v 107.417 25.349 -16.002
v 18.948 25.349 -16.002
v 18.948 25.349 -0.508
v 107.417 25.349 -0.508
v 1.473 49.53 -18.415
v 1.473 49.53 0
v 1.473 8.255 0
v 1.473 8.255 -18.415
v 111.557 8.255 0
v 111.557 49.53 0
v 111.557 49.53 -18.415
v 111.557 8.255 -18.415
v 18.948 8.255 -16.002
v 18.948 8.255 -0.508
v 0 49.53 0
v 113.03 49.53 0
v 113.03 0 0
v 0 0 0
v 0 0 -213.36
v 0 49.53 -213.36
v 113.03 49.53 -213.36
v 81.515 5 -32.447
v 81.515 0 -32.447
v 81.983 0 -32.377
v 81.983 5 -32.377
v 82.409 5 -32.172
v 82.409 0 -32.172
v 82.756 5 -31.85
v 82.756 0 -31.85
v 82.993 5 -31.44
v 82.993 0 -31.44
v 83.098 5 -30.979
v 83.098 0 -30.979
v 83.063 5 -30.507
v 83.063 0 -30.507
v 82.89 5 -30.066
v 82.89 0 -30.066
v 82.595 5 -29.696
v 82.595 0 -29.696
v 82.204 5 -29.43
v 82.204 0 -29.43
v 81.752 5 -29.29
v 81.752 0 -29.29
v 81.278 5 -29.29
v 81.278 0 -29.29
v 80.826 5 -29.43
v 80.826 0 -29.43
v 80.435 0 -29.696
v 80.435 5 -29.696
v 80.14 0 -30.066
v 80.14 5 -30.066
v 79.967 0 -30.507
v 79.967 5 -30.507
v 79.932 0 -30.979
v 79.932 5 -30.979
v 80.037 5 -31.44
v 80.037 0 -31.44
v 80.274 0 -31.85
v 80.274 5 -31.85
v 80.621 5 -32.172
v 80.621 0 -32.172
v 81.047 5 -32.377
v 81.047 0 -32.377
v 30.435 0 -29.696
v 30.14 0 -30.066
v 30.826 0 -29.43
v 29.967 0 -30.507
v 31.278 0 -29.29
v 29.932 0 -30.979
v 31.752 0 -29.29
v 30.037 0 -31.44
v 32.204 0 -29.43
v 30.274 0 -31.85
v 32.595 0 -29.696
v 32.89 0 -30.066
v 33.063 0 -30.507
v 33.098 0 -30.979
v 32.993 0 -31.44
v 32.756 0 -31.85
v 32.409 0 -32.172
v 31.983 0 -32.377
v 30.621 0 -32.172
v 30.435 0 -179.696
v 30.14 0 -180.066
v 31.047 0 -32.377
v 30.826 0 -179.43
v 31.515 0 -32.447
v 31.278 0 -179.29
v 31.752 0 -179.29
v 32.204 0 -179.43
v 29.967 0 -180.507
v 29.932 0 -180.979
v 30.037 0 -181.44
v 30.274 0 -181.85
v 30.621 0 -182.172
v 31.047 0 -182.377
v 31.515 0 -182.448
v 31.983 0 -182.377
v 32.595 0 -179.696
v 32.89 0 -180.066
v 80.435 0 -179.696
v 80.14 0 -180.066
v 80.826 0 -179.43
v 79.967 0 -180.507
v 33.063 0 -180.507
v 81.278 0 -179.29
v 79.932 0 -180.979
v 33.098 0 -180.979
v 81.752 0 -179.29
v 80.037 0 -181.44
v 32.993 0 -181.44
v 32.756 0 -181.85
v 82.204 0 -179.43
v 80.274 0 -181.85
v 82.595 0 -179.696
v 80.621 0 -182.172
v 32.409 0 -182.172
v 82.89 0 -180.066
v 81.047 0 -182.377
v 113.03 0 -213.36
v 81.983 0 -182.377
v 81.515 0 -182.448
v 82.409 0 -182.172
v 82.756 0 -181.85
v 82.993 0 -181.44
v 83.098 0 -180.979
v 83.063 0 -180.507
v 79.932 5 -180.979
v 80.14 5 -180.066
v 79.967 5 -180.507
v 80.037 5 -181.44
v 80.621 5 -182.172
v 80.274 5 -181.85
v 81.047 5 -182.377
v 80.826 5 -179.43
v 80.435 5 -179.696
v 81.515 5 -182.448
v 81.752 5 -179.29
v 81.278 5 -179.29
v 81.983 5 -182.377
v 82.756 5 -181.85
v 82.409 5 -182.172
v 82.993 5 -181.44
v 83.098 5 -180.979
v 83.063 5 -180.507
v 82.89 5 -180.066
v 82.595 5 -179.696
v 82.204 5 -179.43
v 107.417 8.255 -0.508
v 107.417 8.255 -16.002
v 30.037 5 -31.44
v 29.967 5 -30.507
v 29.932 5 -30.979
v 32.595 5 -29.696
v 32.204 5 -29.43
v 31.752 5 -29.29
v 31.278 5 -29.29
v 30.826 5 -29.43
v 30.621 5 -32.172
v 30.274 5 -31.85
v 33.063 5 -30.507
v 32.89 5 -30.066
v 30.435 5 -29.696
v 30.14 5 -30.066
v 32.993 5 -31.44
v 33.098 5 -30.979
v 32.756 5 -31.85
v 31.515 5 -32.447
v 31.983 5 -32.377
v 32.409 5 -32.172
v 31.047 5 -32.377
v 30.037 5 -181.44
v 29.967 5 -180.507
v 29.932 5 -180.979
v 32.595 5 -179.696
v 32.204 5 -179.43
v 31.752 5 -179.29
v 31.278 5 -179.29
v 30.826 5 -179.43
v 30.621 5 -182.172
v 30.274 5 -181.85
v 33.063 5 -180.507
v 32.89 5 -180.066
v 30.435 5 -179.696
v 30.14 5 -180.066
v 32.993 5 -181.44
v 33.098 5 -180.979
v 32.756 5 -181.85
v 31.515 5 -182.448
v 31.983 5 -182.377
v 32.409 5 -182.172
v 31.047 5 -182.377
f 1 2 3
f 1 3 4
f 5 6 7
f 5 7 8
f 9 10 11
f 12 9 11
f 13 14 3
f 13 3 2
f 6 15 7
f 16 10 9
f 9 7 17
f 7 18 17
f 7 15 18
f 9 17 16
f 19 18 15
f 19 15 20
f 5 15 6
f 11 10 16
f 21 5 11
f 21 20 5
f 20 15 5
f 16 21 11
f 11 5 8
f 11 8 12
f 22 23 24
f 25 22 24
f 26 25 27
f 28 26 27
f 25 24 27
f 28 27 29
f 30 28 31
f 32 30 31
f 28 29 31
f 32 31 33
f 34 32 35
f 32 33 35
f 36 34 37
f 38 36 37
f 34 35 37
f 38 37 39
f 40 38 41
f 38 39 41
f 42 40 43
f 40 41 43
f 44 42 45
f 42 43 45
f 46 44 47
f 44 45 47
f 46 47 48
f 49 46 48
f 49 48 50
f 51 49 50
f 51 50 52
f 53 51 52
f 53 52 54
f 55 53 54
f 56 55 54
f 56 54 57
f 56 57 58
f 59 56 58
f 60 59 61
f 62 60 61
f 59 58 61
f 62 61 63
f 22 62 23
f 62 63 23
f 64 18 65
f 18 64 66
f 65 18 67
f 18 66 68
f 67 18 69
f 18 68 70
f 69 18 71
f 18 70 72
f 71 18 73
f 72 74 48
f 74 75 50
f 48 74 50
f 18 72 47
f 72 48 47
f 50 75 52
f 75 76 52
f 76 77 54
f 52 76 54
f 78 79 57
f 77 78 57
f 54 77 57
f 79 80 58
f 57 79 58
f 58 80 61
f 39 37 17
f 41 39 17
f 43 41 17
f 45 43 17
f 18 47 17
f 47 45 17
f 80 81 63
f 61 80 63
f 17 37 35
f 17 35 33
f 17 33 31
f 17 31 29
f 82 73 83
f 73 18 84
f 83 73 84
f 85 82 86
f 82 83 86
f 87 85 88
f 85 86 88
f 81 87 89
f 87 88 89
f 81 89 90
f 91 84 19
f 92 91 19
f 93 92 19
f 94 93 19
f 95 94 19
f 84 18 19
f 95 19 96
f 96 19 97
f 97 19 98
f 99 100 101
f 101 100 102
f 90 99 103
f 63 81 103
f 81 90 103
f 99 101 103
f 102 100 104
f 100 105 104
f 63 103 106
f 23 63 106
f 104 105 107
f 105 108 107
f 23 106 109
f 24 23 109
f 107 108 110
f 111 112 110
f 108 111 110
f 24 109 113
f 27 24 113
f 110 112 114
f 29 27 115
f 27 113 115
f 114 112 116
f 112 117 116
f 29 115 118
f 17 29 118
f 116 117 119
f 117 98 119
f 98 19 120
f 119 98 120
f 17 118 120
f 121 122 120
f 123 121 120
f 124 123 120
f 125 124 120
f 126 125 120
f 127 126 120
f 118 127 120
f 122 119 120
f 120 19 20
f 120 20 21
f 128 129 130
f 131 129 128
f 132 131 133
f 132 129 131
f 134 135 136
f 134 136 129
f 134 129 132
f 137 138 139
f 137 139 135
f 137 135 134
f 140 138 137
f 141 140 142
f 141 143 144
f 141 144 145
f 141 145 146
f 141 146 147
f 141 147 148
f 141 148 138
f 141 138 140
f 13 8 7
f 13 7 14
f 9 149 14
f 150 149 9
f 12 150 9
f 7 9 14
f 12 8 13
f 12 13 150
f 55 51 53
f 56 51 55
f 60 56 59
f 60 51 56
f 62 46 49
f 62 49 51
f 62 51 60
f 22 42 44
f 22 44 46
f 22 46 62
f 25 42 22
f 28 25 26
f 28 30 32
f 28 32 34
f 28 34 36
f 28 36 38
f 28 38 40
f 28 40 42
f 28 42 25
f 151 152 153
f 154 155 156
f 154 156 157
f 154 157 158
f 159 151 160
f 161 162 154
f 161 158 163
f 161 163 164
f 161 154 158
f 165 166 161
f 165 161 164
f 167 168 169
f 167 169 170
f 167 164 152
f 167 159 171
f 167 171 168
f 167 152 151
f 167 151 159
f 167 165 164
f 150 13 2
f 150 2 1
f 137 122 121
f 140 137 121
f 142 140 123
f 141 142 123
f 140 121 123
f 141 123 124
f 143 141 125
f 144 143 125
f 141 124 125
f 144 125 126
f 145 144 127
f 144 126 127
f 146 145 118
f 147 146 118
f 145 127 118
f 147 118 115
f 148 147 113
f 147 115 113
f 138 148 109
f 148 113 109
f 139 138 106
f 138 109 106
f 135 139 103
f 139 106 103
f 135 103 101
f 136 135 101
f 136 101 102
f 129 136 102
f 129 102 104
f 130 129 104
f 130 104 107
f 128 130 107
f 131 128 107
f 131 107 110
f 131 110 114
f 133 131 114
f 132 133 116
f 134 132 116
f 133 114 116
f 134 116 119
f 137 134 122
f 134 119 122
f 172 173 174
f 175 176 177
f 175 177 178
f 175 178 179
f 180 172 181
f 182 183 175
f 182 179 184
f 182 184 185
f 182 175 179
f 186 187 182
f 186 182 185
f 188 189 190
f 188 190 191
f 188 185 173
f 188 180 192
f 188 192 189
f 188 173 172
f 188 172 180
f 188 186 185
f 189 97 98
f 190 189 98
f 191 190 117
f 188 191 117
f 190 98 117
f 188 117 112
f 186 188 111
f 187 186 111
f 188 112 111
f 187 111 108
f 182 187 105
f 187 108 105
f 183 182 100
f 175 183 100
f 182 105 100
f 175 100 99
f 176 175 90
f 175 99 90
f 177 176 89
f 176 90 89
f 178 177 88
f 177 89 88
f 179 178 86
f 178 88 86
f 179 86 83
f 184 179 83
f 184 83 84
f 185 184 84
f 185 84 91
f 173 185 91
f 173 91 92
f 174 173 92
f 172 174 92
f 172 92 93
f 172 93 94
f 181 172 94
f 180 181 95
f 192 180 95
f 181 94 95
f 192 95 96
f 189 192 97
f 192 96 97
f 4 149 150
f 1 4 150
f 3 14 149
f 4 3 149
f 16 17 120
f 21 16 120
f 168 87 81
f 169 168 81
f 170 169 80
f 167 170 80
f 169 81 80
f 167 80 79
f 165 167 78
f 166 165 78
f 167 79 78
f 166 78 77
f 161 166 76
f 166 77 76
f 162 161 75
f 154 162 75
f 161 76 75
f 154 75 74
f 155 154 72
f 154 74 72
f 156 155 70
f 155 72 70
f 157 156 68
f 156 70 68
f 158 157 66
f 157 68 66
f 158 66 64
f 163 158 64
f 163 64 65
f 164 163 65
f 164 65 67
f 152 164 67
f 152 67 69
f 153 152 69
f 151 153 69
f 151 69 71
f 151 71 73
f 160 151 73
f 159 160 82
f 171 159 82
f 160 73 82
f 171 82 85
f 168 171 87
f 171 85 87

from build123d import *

# Parameters (mm, degrees)
SKETCH1_W           = 113.03
SKETCH1_H           = 213.36
BOSS_EXTRUDE1_DEPTH = 49.53
SKETCH2_W           = 110.0836
SKETCH2_H           = 18.415
CUT_EXTRUDE1_DEPTH  = 41.275
SKETCH3_W           = 88.4682
SKETCH3_H           = 15.494
BOSS_EXTRUDE2_DEPTH = 17.0942
SKETCH4_R           = 1.5875
CUT_EXTRUDE2_DEPTH  = 5


with BuildPart() as part:
    # Sketch1 → Boss-Extrude1 (new body)
    with BuildSketch(Plane(origin=(0, 0, 0), x_dir=(1, 0, 0), z_dir=(0, 1, 0))):
        with Locations((56.515, 106.68)):
            Rectangle(SKETCH1_W, SKETCH1_H)
    extrude(amount=BOSS_EXTRUDE1_DEPTH)

    # Sketch2 → Cut-Extrude1 (cut)
    with BuildSketch(Plane(origin=(0, 49.53, 0), x_dir=(1, 0, 0), z_dir=(0, 1, 0))):
        with Locations((56.515, 9.2075)):
            Rectangle(SKETCH2_W, SKETCH2_H)
    extrude(amount=-CUT_EXTRUDE1_DEPTH, mode=Mode.SUBTRACT)

    # Sketch3 → Boss-Extrude2 (add)
    with BuildSketch(Plane(origin=(0, 8.255, 0), x_dir=(1, 0, 0), z_dir=(0, 1, 0))):
        with Locations((63.1825, 8.255)):
            Rectangle(SKETCH3_W, SKETCH3_H)
    extrude(amount=BOSS_EXTRUDE2_DEPTH)

    # Sketch4 → Cut-Extrude2 (cut)
    with BuildSketch(Plane.XZ):
        with Locations(Location((81.515, -180.86, 0), (0, 0, 270))):
            Circle(SKETCH4_R)
        with Locations(Location((31.515, -180.86, 0), (0, 0, 270))):
            Circle(SKETCH4_R)
        with Locations(Location((81.515, -30.86, 0), (0, 0, 270))):
            Circle(SKETCH4_R)
        with Locations(Location((31.515, -30.86, 0), (0, 0, 270))):
            Circle(SKETCH4_R)
    extrude(amount=-CUT_EXTRUDE2_DEPTH, mode=Mode.SUBTRACT)


solid = part.part
